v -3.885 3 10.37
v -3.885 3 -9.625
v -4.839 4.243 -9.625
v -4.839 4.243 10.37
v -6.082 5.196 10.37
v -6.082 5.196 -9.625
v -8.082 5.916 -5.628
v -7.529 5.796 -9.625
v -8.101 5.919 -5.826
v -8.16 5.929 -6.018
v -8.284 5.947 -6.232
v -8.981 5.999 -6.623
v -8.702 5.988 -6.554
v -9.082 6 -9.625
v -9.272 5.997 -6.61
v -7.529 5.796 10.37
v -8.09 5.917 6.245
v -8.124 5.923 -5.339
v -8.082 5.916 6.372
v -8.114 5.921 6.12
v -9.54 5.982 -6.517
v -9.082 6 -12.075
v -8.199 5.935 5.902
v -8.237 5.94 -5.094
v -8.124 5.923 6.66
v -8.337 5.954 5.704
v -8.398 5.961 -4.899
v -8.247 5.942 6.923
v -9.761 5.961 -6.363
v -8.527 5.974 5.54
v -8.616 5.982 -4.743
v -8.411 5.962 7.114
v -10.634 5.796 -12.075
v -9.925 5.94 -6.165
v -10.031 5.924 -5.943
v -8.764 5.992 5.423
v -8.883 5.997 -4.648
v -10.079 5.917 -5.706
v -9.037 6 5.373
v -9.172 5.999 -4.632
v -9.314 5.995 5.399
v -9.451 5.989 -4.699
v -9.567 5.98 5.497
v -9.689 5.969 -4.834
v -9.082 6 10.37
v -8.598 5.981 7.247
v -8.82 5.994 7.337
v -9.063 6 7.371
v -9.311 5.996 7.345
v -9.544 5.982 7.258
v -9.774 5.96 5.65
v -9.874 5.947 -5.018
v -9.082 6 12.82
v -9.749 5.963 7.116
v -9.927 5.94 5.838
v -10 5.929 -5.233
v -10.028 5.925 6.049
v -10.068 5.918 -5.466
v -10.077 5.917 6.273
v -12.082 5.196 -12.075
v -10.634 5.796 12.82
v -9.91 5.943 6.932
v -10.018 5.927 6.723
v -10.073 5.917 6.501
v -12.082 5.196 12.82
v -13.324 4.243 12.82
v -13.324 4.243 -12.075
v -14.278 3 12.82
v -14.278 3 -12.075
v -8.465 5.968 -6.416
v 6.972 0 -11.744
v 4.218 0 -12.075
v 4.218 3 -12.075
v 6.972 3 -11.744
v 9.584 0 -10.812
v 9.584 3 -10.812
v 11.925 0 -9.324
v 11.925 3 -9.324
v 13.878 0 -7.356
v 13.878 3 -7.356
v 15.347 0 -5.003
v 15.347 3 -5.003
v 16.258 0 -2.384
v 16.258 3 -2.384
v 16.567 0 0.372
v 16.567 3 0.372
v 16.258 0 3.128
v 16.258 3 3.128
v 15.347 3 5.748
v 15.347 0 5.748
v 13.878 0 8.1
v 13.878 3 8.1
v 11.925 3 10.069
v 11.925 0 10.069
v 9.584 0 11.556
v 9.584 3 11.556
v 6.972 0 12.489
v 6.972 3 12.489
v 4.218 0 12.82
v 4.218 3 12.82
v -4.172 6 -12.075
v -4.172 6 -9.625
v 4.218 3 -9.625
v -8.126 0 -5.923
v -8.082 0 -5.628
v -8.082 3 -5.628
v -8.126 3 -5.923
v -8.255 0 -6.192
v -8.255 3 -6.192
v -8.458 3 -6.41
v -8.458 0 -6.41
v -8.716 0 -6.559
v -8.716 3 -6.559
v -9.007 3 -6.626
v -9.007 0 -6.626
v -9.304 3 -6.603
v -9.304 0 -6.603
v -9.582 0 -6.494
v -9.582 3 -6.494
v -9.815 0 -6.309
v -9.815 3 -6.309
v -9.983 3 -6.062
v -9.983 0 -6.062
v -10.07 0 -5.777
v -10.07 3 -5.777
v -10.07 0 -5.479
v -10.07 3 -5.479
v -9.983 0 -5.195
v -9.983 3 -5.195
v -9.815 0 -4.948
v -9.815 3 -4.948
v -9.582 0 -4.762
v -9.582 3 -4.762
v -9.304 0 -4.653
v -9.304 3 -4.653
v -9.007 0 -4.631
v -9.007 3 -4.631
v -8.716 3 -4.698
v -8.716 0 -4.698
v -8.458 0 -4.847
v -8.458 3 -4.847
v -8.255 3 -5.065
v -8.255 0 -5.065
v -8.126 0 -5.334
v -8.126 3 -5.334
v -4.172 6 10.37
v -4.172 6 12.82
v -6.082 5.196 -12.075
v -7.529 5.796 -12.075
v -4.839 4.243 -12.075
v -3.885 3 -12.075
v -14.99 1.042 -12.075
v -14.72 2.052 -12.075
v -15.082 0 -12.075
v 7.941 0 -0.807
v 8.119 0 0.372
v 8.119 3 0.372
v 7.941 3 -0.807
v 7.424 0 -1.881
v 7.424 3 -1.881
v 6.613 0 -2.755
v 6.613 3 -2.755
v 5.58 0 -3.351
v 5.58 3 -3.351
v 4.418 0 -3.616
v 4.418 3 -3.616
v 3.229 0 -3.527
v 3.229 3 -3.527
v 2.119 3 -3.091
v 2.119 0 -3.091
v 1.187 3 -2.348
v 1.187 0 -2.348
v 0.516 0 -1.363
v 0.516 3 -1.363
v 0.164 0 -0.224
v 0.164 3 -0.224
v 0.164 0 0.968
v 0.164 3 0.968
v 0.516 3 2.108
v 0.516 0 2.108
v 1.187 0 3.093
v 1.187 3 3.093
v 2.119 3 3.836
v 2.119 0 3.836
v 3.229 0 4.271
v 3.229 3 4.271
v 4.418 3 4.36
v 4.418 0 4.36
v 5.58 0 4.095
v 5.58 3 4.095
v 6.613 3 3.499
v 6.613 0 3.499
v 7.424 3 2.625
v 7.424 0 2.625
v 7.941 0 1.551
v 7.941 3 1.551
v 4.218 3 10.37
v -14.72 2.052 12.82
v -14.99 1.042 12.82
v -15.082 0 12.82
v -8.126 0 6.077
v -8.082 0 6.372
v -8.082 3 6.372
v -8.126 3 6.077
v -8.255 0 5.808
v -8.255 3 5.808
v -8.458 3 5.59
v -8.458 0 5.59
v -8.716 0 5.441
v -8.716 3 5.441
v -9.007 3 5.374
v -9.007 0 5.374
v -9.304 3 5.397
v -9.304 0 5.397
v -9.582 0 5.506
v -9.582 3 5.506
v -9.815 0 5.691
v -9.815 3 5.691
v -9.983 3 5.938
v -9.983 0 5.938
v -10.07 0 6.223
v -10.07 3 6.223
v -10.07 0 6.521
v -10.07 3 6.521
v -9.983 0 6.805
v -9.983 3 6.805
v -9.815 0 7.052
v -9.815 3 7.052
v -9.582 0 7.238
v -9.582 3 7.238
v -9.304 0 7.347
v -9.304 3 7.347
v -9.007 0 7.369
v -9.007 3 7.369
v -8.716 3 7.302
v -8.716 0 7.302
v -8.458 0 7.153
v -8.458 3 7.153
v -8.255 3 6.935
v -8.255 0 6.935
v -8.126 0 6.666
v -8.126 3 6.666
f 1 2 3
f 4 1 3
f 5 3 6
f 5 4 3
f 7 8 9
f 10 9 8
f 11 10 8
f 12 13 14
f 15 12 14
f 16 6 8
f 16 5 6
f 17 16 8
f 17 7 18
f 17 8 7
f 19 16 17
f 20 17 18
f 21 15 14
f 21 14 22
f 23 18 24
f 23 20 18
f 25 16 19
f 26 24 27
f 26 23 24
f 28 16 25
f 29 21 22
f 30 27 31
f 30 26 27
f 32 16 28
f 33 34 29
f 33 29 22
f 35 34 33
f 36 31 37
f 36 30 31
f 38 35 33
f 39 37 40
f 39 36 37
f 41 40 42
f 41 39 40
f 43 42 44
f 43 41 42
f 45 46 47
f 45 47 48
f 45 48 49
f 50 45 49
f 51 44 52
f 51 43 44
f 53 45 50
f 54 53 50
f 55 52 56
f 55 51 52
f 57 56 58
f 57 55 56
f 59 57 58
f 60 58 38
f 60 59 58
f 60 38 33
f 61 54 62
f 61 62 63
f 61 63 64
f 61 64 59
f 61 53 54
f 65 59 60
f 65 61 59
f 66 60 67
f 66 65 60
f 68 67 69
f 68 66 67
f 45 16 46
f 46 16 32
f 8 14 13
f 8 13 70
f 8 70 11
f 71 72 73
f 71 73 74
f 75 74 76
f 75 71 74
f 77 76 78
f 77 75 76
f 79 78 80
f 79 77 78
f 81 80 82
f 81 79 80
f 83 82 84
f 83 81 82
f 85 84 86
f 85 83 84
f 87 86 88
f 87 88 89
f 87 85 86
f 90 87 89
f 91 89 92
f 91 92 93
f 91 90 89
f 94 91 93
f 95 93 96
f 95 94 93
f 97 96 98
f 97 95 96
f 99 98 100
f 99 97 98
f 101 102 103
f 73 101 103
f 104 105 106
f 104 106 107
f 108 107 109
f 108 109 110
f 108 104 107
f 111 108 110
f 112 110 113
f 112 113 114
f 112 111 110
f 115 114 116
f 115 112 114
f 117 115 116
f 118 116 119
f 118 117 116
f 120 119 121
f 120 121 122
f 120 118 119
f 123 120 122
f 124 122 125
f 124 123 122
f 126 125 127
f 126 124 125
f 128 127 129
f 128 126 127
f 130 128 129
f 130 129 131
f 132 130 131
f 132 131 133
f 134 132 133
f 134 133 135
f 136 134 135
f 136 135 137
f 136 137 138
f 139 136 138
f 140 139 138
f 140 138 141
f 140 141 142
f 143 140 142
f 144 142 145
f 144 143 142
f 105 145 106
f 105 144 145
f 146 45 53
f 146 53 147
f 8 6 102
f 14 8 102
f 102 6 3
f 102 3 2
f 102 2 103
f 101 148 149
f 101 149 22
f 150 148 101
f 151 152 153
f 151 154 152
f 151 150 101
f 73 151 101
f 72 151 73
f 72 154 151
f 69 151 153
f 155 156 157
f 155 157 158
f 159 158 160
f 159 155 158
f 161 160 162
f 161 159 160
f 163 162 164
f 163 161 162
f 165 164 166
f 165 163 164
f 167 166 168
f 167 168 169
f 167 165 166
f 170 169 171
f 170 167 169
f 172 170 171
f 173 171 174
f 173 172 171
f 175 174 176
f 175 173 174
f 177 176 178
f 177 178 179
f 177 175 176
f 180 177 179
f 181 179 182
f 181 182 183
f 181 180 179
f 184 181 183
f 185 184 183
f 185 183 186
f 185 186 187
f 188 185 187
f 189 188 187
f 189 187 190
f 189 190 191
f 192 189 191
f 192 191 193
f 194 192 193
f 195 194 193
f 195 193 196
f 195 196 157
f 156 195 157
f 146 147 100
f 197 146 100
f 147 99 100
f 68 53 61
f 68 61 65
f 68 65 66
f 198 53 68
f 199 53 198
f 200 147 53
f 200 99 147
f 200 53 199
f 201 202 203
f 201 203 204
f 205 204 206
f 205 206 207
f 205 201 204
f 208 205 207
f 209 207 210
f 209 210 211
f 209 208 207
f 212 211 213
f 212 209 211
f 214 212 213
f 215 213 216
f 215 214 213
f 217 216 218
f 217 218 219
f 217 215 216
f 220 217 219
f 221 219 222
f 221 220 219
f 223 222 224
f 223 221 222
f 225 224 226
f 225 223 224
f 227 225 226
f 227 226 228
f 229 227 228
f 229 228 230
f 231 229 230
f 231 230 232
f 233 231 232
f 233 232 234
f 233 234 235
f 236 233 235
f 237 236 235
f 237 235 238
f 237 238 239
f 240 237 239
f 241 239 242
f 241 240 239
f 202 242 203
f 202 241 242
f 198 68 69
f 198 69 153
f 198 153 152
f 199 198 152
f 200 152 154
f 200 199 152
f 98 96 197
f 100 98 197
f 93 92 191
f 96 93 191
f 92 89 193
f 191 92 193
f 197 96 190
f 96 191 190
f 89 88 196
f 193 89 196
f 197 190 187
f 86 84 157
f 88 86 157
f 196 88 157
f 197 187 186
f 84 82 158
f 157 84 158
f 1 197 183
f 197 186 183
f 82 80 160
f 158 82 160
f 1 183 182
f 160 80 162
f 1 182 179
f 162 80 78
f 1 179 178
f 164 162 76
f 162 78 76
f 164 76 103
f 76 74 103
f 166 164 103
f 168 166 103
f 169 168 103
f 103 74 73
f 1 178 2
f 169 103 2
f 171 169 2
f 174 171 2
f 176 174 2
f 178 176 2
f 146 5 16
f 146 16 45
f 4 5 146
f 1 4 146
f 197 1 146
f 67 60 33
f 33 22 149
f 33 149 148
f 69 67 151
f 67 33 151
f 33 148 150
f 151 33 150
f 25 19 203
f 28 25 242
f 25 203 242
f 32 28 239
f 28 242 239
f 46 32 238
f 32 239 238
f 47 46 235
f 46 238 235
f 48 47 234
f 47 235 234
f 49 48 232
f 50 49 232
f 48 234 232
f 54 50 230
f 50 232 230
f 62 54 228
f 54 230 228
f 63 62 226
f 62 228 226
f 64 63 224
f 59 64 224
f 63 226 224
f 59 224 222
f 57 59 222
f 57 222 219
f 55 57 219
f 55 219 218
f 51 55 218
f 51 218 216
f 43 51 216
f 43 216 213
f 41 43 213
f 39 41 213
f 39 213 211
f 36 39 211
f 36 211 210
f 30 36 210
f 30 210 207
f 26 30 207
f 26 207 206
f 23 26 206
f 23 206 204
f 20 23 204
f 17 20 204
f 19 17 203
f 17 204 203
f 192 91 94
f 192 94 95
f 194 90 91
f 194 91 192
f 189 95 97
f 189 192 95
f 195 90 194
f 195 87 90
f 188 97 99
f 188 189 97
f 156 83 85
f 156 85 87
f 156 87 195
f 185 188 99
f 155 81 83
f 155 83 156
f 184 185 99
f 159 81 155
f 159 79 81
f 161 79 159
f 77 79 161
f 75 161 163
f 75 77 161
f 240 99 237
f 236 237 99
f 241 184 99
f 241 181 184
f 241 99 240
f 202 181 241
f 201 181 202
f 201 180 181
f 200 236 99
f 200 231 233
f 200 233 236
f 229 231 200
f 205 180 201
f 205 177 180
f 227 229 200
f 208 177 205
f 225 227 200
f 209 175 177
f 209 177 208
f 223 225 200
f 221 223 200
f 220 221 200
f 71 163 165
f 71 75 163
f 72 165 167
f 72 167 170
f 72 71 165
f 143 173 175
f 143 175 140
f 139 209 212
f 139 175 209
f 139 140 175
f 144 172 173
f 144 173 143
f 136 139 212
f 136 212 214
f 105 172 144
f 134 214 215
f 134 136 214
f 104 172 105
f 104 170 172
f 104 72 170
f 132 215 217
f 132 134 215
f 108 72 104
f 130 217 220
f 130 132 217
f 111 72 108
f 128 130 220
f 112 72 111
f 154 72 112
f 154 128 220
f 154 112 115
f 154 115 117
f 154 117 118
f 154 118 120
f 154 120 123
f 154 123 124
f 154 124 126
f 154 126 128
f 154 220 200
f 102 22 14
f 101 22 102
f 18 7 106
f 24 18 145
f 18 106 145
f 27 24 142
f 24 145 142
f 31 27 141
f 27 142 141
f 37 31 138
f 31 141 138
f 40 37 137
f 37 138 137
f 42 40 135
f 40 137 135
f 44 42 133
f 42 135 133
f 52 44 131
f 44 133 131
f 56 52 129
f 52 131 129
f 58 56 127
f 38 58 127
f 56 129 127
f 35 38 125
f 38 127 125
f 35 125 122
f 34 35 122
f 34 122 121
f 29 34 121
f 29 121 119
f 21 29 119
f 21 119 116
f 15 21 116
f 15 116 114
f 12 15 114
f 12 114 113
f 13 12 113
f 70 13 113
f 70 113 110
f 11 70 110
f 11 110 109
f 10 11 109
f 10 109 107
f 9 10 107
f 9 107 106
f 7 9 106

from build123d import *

# Parameters (mm, degrees)
CROQUIS1_R              = 3.999426158
CROQUIS1_R_2            = 1.000000121
CROQUIS1_R_3            = 1.000000477
SALIENTE_EXTRUIR1_DEPTH = 3
SALIENTE_EXTRUIR2_DEPTH = 24.89496
CROQUIS3_W              = 13.299999714
CROQUIS3_H              = 2.45
SALIENTE_EXTRUIR3_DEPTH = 3
CORTAR_EXTRUIR1_DEPTH   = 24.89496
CROQUIS5_R              = 1.000000121
CROQUIS5_R_2            = 1.000000477
CORTAR_EXTRUIR2_DEPTH   = 11


with BuildPart() as part:
    # Croquis1 → Saliente-Extruir1 (new body)
    with BuildSketch(Plane(origin=(0, 0, 0), x_dir=(1, 0, 0), z_dir=(0, 1, 0))):
        with BuildLine():
            Line((4.218422555, -12.81969876), (-15.081577159, -12.81969876))
            Line((-15.081577159, -12.81969876), (-15.081577159, 12.075260967))
            Line((-15.081577159, 12.075260967), (4.218422555, 12.075260967))
            ThreePointArc((4.218422555, 12.075260967), (16.567050884, -0.372218896), (4.218422555, -12.81969876))
        make_face()
        with Locations((4.119175364, -0.372218896)):
            Circle(CROQUIS1_R, mode=Mode.SUBTRACT)
        with Locations((-9.081577367, 5.628403394)):
            Circle(CROQUIS1_R_2, mode=Mode.SUBTRACT)
        with Locations((-9.081576585, -6.371596672)):
            Circle(CROQUIS1_R_3, mode=Mode.SUBTRACT)
    extrude(amount=SALIENTE_EXTRUIR1_DEPTH)

    # Croquis2 → Saliente-Extruir2 (add)
    with BuildSketch(Plane.XY.offset(12.81969876)):
        with BuildLine():
            Line((-14.277729582, 3), (-3.885424736, 3))
            ThreePointArc((-3.885424736, 3), (-9.081577159, 6), (-14.277729582, 3))
        make_face()
    extrude(amount=-SALIENTE_EXTRUIR2_DEPTH)

    # Croquis3 → Saliente-Extruir3 (add)
    with BuildSketch(Plane(origin=(0, 3, 0), x_dir=(1, 0, 0), z_dir=(0, 1, 0))):
        with Locations((-2.431577302, -11.59469876)):
            Rectangle(CROQUIS3_W, CROQUIS3_H)
        with Locations((-2.431577302, 10.850260967)):
            Rectangle(CROQUIS3_W, CROQUIS3_H)
    extrude(amount=SALIENTE_EXTRUIR3_DEPTH)

    # Croquis4 → Cortar-Extruir1 (cut)
    with BuildSketch(Plane.XY.offset(12.81969876)):
        Polygon((-4.171577445, 6), (4.218422555, 3), (4.218422555, 6), align=None)
        with BuildLine():
            Line((-15.081577159, 0), (-16.256016644, 0))
            ThreePointArc((-16.256016644, 0), (-14.36312843, 4.855697487), (-9.683294652, 7.149162047))
            Line((-9.683294652, 7.149162047), (-9.683294652, 5.969751759))
            ThreePointArc((-9.683294652, 5.969751759), (-13.53187518, 4.024282237), (-15.081577159, 0))
        make_face()
    extrude(amount=-CORTAR_EXTRUIR1_DEPTH, mode=Mode.SUBTRACT)

    # Croquis5 → Cortar-Extruir2 (cut)
    with BuildSketch(Plane.XZ):
        with Locations((-9.081577367, -5.628403394)):
            Circle(CROQUIS5_R)
        with Locations((-9.081576585, 6.371596672)):
            Circle(CROQUIS5_R_2)
    extrude(amount=-CORTAR_EXTRUIR2_DEPTH, mode=Mode.SUBTRACT)


solid = part.part
